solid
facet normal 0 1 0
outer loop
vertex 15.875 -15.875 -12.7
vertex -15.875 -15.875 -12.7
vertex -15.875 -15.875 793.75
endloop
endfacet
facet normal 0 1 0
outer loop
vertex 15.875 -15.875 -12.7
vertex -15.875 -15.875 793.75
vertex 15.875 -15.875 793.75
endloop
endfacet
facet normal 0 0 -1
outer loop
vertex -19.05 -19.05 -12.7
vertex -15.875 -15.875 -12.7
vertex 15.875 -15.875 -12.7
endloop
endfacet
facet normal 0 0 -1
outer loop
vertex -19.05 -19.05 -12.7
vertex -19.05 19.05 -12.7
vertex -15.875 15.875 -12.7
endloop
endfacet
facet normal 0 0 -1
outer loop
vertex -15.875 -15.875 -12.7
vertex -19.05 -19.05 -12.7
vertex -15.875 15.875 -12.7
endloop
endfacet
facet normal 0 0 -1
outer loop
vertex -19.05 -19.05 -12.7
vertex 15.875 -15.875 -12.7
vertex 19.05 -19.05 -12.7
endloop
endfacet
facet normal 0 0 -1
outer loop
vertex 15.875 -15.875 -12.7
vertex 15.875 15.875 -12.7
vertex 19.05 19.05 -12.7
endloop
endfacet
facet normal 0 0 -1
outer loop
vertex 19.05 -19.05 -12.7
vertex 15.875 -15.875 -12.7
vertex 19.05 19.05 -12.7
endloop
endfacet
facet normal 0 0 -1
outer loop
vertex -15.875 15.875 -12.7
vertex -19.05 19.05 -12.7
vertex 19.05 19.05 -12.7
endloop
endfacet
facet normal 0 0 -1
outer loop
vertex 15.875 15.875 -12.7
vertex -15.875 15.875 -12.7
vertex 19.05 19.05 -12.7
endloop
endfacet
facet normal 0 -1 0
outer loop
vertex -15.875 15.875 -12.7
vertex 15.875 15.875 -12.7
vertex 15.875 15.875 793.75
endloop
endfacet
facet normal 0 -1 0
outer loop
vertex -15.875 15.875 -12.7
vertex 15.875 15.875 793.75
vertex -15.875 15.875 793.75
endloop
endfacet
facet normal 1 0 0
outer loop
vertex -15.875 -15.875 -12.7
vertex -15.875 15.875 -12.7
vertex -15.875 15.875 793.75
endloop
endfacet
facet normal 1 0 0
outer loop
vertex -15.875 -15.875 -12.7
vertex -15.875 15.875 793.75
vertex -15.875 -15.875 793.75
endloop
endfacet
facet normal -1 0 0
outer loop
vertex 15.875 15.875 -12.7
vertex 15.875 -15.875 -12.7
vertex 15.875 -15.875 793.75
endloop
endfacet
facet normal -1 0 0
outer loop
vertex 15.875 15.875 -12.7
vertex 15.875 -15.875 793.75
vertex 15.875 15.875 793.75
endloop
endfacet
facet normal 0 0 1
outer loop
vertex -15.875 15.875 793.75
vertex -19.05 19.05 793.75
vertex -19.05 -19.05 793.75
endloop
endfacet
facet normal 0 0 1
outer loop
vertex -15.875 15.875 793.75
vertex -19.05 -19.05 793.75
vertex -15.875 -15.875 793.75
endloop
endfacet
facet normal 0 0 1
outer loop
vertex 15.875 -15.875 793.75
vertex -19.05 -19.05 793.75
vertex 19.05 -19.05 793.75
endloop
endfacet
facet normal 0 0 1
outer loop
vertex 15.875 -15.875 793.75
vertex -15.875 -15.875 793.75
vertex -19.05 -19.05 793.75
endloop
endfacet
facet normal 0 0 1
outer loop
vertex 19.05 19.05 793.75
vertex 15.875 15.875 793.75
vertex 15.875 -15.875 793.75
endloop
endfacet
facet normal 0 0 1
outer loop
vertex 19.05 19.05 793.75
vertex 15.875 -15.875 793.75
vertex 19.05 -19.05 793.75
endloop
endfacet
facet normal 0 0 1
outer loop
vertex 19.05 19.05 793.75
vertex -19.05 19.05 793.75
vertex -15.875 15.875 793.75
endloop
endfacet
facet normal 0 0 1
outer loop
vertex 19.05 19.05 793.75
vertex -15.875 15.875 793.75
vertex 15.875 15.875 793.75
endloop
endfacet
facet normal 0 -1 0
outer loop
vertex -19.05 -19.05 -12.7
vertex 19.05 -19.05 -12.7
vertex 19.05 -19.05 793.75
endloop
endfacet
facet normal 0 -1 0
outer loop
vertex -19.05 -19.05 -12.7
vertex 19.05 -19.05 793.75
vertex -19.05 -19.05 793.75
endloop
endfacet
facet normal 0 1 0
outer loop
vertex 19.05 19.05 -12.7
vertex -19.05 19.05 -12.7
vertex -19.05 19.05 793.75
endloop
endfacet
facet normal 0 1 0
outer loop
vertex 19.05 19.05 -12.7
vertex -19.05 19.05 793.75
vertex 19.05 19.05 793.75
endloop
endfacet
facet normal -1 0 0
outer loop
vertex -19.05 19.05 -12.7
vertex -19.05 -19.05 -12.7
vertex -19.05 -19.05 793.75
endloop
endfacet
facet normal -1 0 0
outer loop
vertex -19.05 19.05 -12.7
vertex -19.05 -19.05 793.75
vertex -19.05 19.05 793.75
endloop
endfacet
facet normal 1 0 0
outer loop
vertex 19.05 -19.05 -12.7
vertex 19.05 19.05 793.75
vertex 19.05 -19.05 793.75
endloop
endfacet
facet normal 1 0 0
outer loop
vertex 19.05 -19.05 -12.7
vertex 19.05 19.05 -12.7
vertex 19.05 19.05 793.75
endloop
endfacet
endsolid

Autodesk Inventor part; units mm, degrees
ref_plane "Start Plane" through (0, 0, -12.7) normal (0, 0, 1) x (1, 0, 0)
ref_plane "End Plane" through (0, 0, 793.75) normal (0, 0, 1) x (1, 0, 0)
sketch "Sketch" plane through (0, 0, 0) normal (0, 0, 1) x (1, 0, 0)
  line L0 (-19.05, 19.05) -> (19.05, 19.05)
  line L1 (19.05, 19.05) -> (19.05, -19.05)
  line L2 (19.05, -19.05) -> (-19.05, -19.05)
  line L3 (-19.05, -19.05) -> (-19.05, 19.05)
  line L4 (15.875, 15.875) -> (-15.875, 15.875)
  line L5 (-15.875, 15.875) -> (-15.875, -15.875)
  line L6 (-15.875, -15.875) -> (15.875, -15.875)
  line L7 (15.875, -15.875) -> (15.875, 15.875)
  point P0 (0, 0)
  point P1 (0, 19.05)
  point P2 (-19.05, 0)
  dimension "width" = 38.1
  dimension "d1" = 3.175
extrude "Body" add sketch "Sketch" along normal up to surface (806.45 mm away) from surface at -12.7
sketch "Sketch4" plane through (0, 0, 0) normal (0, 0, 1) x (1, 0, 0)
  line L0 (0, 0) -> (10, 0)
ref_plane "Work Plane4" through (0, 0, 0) normal (0, -1, 0) x (1, 0, 0)
sketch "Sketch5" plane through (0, 0, 0) normal (0, -1, 0) x (1, 0, 0)
  line L0 (-2, -12.7) -> (12, -12.7)
  line L1 (-2, 793.75) -> (12, 793.75)
  dimension "d9" = 806.45
ref_plane "Work Plane5" through (-762, -1149.35, 793.75) normal (0, 0, 1) x (1, 0, 0)
split "Split1" plane through (-762, -1149.35, 793.75) removes the side toward (0, 0, 1)
ref_plane "Work Plane6" through (0, 19.05, -12.7) normal (0, 0, -1) x (-1, 0, 0)
split "Split2" plane through (0, 19.05, -12.7) removes the side toward (0, 0, -1)
equation "\"G_OFFSET_START\" = 12.7"
equation "\"G_OFFSET_END\" = -19.05"
equation "\"d4\" = -G_OFFSET_START"
equation "\"d5\" = length + G_OFFSET_END"
equation "\"G_L\" = 812.8"
equation "\"length\" = 812.8"
properties part number "1.5x1.5x.125 Tube" material "Aluminum-6061"
